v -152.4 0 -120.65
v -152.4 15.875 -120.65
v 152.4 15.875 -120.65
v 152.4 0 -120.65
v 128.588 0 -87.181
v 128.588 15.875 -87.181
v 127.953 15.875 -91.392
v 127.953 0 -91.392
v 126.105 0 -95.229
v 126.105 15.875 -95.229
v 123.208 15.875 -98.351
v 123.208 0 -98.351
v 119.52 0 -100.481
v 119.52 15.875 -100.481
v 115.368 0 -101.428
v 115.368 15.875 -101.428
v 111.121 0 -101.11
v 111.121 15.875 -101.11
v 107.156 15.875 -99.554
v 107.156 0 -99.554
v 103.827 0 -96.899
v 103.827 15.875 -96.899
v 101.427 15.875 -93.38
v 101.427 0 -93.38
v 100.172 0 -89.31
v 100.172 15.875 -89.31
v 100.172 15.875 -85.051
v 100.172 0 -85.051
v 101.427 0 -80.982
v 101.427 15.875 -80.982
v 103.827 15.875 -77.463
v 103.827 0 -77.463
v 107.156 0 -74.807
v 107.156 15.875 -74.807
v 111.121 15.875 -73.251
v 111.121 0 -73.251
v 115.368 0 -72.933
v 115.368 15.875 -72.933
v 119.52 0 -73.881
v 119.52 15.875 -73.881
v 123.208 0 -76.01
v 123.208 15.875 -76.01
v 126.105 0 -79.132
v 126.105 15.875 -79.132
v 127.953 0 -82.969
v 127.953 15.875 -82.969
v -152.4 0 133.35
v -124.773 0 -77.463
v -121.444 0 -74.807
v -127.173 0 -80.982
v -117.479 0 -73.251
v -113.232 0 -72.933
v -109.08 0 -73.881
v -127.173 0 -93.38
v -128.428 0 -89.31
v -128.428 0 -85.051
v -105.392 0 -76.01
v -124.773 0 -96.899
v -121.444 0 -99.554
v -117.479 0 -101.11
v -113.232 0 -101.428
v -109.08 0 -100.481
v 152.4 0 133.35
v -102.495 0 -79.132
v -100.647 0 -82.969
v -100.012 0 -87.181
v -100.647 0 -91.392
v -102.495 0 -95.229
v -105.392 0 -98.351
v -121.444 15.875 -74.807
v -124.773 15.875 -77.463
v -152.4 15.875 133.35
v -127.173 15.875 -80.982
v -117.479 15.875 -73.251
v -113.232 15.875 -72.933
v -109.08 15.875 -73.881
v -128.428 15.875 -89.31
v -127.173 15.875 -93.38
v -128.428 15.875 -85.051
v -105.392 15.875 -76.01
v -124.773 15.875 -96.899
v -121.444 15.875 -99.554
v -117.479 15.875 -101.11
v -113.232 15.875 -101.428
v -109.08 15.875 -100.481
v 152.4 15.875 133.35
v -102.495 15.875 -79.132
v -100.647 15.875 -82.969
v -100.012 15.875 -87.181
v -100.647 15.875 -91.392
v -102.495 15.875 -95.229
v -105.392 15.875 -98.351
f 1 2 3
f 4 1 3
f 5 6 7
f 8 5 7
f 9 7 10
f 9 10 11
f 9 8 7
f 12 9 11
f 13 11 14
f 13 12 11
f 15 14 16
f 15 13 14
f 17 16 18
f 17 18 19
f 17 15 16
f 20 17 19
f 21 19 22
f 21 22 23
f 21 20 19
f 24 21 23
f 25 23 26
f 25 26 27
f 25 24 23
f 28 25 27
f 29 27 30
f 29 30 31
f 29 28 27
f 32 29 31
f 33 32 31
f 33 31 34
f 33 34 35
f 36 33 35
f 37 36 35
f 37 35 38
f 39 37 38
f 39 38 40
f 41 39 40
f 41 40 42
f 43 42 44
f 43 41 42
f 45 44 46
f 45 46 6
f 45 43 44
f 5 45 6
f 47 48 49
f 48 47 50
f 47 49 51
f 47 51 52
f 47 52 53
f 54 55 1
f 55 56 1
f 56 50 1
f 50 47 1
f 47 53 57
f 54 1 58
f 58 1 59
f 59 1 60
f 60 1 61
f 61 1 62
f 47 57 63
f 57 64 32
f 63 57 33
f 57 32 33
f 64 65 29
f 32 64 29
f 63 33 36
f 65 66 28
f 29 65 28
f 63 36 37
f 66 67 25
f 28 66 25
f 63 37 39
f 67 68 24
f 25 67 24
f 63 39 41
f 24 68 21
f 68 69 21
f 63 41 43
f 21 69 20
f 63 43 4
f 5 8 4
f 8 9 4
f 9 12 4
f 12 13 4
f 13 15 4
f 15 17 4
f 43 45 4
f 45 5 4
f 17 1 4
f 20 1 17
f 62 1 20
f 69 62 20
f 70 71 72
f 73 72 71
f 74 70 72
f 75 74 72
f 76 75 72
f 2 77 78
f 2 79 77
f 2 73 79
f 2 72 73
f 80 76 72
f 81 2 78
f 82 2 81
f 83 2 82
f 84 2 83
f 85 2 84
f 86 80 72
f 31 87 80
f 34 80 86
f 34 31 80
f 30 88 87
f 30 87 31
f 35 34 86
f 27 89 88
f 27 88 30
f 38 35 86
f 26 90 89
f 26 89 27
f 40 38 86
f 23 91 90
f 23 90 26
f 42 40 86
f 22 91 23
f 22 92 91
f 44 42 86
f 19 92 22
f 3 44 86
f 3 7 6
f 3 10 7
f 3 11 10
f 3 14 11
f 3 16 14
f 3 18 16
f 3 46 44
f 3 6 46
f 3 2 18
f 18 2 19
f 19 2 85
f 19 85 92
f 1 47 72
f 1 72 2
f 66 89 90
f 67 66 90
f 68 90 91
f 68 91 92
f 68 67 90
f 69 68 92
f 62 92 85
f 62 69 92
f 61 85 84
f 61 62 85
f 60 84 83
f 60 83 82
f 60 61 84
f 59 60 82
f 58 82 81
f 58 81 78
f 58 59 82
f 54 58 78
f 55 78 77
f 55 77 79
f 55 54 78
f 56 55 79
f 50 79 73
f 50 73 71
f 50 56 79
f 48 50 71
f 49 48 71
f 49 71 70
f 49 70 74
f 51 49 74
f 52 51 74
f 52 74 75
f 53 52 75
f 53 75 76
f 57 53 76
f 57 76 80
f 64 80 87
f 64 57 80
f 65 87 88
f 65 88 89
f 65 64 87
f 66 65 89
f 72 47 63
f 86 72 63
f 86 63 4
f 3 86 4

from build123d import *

# Parameters (mm, degrees)
SKETCH1_W           = 304.8
SKETCH1_H           = 266.7
SKETCH1_R           = 14.2875
BOSS_EXTRUDE1_DEPTH = 15.875
SKETCH2_W           = 304.8
SKETCH2_H           = 12.7
CUT_EXTRUDE1_DEPTH  = 16.875


with BuildPart() as part:
    # Sketch1 → Boss-Extrude1 (new body)
    with BuildSketch(Plane(origin=(0, 0, 0), x_dir=(1, 0, 0), z_dir=(0, 1, 0))):
        Rectangle(SKETCH1_W, SKETCH1_H)
        with Locations((-114.3, 87.180661253)):
            Circle(SKETCH1_R, mode=Mode.SUBTRACT)
        with Locations((114.3, 87.180661253)):
            Circle(SKETCH1_R, mode=Mode.SUBTRACT)
    extrude(amount=BOSS_EXTRUDE1_DEPTH)

    # Sketch2 → Cut-Extrude1 (cut, through all)
    with BuildSketch(Plane(origin=(0, 15.875, 0), x_dir=(1, 0, 0), z_dir=(0, 1, 0))):
        with Locations((0, 127)):
            Rectangle(SKETCH2_W, SKETCH2_H)
    extrude(amount=-CUT_EXTRUDE1_DEPTH, mode=Mode.SUBTRACT)


solid = part.part
